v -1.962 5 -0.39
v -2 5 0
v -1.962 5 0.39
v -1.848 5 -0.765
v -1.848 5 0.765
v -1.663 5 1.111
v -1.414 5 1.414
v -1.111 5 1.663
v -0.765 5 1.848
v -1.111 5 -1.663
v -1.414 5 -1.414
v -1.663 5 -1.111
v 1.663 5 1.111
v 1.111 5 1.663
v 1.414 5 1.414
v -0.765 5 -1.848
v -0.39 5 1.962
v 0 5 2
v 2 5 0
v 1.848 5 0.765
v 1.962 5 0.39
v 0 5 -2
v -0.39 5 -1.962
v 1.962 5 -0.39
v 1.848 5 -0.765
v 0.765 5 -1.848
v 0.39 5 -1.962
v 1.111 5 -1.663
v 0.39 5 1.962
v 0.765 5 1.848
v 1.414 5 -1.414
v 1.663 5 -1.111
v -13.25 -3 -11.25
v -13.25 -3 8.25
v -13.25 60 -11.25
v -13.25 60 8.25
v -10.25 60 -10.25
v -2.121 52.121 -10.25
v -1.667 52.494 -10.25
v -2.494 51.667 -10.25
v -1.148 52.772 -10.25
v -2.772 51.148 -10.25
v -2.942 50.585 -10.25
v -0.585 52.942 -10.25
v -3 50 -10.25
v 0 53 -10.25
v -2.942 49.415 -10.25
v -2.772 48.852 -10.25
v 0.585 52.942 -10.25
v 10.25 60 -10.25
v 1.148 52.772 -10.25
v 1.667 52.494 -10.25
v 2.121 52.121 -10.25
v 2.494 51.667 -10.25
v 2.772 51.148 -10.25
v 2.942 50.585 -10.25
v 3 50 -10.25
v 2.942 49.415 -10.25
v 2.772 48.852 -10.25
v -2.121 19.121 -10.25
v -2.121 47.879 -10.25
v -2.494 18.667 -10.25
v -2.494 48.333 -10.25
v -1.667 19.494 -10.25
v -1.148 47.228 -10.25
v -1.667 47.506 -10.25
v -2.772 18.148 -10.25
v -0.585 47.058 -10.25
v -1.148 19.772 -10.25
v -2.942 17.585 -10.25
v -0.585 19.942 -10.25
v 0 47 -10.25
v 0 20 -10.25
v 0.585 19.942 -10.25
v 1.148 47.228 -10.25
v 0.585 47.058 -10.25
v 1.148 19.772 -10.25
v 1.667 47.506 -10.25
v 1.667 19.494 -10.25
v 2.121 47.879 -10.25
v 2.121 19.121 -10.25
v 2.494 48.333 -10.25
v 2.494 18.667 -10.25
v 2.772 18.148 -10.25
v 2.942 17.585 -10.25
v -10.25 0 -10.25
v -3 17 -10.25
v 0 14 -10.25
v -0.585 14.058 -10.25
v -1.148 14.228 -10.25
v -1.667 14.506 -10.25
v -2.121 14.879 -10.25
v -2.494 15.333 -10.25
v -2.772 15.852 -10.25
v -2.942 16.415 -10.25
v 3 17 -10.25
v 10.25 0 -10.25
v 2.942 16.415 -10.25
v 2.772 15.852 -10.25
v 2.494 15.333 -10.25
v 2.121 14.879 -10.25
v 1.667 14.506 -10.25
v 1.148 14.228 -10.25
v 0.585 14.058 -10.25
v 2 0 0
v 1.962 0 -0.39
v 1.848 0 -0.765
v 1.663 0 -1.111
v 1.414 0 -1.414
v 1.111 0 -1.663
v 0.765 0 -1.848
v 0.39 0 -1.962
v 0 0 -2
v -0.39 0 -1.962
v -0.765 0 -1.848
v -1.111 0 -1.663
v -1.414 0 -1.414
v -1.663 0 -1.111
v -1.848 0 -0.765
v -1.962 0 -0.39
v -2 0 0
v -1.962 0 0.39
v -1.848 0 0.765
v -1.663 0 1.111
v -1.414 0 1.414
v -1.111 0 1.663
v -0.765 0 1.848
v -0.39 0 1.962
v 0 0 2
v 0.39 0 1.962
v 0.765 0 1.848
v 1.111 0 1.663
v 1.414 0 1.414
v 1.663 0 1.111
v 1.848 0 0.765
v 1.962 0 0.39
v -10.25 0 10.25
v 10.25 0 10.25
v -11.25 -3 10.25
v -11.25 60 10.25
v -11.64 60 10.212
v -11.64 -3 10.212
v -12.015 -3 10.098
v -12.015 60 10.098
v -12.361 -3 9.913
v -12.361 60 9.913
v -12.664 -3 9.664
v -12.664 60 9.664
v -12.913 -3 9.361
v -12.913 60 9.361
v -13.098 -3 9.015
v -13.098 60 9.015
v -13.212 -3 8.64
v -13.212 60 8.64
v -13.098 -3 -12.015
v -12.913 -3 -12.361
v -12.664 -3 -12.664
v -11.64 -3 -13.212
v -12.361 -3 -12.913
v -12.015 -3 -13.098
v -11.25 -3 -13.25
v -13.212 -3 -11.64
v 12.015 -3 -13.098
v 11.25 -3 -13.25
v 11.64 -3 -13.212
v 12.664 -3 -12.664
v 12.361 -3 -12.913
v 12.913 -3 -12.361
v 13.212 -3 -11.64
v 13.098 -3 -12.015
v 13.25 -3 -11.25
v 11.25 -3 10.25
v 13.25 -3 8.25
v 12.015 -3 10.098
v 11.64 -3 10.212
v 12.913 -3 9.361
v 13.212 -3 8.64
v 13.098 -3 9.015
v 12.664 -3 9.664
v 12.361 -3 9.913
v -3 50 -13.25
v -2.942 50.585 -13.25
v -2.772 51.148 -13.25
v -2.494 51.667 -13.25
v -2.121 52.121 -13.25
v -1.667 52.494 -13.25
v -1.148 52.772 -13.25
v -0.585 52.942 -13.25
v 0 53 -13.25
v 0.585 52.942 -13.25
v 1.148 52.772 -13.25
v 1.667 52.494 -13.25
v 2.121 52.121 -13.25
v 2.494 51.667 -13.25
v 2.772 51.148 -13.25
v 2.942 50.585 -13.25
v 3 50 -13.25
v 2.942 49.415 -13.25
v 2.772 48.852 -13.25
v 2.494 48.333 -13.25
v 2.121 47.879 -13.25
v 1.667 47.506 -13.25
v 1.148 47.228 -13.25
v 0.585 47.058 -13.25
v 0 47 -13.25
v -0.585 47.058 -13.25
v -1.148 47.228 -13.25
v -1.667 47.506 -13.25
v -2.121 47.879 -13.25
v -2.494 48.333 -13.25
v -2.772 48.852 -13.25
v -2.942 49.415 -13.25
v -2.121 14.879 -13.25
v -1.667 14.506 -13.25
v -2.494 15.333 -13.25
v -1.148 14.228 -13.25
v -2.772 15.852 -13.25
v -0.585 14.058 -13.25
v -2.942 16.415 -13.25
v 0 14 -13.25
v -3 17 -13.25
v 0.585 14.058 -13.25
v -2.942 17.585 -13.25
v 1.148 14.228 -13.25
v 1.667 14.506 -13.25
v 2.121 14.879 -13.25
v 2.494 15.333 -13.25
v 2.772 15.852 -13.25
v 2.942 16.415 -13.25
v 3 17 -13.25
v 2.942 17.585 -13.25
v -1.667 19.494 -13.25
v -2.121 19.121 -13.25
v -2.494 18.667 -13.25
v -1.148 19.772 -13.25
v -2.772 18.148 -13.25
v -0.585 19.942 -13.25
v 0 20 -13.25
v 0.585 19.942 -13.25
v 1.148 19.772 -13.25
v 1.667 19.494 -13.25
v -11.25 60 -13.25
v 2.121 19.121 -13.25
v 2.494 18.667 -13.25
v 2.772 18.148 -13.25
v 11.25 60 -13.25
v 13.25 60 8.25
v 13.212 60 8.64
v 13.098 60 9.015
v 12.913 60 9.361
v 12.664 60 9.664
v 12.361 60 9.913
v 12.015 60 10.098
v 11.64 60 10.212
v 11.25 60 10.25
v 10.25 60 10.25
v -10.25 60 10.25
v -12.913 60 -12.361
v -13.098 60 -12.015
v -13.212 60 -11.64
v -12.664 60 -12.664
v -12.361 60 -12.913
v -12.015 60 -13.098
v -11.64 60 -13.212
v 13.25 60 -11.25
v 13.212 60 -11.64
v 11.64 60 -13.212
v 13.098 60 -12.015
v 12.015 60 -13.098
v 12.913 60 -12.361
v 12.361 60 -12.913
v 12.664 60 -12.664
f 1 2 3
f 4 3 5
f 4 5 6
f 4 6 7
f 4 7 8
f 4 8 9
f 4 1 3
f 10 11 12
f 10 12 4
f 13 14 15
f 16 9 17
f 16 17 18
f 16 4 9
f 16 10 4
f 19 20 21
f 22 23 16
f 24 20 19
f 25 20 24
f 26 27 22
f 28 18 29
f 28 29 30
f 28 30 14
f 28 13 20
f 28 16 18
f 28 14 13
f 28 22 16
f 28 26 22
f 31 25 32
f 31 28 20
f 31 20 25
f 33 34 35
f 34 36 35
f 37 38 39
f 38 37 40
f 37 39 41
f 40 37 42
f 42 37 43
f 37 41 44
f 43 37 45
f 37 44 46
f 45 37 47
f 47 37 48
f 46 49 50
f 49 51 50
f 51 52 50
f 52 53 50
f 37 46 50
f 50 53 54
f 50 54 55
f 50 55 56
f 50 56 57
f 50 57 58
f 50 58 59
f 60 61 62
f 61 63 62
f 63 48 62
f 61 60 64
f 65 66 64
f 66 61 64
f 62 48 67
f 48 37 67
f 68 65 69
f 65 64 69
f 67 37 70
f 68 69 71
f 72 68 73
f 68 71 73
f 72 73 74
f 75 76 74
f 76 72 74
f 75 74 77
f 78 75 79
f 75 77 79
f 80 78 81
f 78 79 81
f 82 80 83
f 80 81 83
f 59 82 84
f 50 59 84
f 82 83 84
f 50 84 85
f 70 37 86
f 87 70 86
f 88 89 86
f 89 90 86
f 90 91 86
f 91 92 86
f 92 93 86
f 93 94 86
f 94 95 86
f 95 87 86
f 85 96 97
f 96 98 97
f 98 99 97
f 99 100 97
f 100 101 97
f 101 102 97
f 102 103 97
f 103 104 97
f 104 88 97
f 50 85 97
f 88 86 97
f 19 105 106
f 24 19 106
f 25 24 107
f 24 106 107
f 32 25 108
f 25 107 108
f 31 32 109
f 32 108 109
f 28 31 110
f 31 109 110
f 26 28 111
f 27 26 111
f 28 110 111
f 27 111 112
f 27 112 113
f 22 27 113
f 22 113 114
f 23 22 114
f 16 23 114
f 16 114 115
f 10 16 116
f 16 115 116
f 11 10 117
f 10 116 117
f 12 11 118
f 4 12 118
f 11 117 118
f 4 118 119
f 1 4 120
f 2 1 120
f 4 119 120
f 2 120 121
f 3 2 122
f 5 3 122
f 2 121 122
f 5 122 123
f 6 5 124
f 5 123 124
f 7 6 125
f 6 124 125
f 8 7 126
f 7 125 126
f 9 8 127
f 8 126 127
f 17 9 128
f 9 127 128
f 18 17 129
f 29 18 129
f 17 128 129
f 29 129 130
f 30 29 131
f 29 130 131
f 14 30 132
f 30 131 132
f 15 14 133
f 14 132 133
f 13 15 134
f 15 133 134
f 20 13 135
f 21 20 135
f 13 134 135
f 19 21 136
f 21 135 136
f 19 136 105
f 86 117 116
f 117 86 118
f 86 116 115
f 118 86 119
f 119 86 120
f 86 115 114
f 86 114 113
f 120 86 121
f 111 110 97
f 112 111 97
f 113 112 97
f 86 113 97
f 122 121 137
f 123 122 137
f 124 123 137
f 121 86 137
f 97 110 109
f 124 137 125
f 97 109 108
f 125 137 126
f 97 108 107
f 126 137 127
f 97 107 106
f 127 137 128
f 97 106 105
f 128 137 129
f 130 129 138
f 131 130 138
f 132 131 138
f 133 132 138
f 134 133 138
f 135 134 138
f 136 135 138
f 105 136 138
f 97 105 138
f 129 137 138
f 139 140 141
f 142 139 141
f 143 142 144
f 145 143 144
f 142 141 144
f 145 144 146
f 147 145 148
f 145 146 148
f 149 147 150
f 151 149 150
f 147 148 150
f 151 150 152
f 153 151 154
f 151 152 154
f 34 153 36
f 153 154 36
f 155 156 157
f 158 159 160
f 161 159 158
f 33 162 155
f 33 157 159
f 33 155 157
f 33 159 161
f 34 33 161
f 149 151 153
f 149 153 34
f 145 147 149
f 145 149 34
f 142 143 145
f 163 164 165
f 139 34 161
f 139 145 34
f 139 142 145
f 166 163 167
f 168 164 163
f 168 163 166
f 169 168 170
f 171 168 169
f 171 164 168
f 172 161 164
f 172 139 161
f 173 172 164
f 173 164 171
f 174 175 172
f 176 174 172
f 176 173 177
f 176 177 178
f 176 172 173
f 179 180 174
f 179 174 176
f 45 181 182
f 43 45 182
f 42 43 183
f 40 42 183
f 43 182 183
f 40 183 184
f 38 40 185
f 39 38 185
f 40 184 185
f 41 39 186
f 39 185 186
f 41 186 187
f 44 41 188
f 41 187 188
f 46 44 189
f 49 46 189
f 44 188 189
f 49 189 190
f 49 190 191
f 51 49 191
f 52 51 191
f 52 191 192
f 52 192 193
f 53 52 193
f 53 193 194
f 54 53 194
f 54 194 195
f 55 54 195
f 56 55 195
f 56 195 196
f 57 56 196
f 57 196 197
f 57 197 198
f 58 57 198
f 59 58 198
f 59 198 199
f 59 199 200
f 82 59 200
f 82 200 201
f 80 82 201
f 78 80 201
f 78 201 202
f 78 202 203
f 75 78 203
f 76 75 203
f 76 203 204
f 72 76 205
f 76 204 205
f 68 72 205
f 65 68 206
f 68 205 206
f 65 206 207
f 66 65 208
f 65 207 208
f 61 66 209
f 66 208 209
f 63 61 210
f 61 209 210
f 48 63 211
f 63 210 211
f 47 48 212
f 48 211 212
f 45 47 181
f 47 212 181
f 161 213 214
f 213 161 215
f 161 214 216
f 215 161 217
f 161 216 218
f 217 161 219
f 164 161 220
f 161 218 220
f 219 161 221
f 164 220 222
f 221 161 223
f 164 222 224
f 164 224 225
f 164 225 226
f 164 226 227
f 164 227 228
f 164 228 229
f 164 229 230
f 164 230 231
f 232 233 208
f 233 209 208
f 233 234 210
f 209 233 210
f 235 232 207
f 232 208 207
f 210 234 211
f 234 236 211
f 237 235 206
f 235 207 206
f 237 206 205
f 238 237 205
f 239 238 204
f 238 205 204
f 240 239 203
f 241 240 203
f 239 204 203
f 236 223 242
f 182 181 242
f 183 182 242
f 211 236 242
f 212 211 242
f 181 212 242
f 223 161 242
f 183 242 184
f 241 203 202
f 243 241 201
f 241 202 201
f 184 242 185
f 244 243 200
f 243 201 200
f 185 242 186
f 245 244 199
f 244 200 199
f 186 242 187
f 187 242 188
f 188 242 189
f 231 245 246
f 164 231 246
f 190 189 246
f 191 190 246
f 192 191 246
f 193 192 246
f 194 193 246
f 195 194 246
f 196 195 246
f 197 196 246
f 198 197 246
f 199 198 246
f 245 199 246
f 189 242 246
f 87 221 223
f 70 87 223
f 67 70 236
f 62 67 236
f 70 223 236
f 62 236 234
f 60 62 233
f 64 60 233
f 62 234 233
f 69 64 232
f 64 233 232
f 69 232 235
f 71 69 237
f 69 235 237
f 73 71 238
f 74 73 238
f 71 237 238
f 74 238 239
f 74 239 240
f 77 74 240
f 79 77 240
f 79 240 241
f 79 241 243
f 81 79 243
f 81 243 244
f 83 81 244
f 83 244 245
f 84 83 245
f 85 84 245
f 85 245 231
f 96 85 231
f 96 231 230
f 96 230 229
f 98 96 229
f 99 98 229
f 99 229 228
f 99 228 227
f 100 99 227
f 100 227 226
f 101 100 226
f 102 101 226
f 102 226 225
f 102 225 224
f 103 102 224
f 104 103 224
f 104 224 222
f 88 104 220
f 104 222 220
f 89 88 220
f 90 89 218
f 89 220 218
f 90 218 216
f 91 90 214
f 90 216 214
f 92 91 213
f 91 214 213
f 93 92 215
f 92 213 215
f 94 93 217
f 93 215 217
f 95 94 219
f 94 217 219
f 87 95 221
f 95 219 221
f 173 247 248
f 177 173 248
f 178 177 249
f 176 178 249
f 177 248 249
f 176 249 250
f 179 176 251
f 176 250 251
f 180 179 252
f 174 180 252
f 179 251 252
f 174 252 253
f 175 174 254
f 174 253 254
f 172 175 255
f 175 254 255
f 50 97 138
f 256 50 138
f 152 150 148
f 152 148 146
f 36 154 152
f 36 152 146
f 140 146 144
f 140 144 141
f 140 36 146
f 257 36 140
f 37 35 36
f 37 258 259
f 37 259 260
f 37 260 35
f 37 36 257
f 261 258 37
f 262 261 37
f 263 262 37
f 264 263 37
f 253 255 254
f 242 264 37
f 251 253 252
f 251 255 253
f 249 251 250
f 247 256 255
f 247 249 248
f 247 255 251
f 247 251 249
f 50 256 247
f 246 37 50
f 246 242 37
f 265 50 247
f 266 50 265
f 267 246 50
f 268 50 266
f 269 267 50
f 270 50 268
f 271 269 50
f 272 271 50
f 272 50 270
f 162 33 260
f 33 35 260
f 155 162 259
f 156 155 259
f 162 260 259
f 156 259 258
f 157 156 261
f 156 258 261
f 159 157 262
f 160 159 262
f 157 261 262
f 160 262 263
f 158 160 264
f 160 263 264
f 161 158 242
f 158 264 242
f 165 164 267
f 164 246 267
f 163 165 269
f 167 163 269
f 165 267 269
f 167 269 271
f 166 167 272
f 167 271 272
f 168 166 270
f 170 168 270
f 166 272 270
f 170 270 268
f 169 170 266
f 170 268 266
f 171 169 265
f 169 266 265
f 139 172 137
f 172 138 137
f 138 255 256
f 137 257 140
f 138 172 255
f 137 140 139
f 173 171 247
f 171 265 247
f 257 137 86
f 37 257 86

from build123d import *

# Parameters (mm, degrees)
BOSS_EXTRUDE1_DEPTH = 60
SKETCH2_W           = 20.5
SKETCH2_H           = 20.5
BOSS_EXTRUDE2_DEPTH = 3
SKETCH3_R           = 2
BOSS_EXTRUDE3_DEPTH = 5
SKETCH4_R           = 3
CUT_EXTRUDE1_DEPTH  = 23.5


with BuildPart() as part:
    # Sketch1 → Boss-Extrude1 (new body)
    with BuildSketch(Plane(origin=(0, 0, 0), x_dir=(1, 0, 0), z_dir=(0, 1, 0))):
        with BuildLine():
            Line((-13.25, 11.25), (-13.25, -8.25))
            ThreePointArc((-13.25, -8.25), (-12.664213562, -9.664213562), (-11.25, -10.25))
            Line((-11.25, -10.25), (-10.25, -10.25))
            Line((-10.25, -10.25), (-10.25, 10.25))
            Line((-10.25, 10.25), (10.25, 10.25))
            Line((10.25, 10.25), (10.25, -10.25))
            Line((10.25, -10.25), (11.25, -10.25))
            ThreePointArc((11.25, -10.25), (12.664213562, -9.664213562), (13.25, -8.25))
            Line((13.25, -8.25), (13.25, 11.25))
            ThreePointArc((13.25, 11.25), (12.664213562, 12.664213562), (11.25, 13.25))
            Line((11.25, 13.25), (-11.25, 13.25))
            ThreePointArc((-11.25, 13.25), (-12.664213562, 12.664213562), (-13.25, 11.25))
        make_face()
    extrude(amount=BOSS_EXTRUDE1_DEPTH)

    # Sketch2 → Boss-Extrude2 (add)
    with BuildSketch(Plane.XZ):
        with BuildLine():
            ThreePointArc((-11.25, 10.25), (-12.664213562, 9.664213562), (-13.25, 8.25))
            Line((-13.25, 8.25), (-13.25, -11.25))
            ThreePointArc((-13.25, -11.25), (-12.664213562, -12.664213562), (-11.25, -13.25))
            Line((-11.25, -13.25), (11.25, -13.25))
            ThreePointArc((11.25, -13.25), (12.664213562, -12.664213562), (13.25, -11.25))
            Line((13.25, -11.25), (13.25, 8.25))
            ThreePointArc((13.25, 8.25), (12.664213562, 9.664213562), (11.25, 10.25))
            Line((11.25, 10.25), (10.25, 10.25))
            Line((10.25, 10.25), (10.25, -10.25))
            Line((10.25, -10.25), (-10.25, -10.25))
            Line((-10.25, -10.25), (-10.25, 10.25))
            Line((-10.25, 10.25), (-11.25, 10.25))
        make_face()
        Rectangle(SKETCH2_W, SKETCH2_H)
    extrude(amount=BOSS_EXTRUDE2_DEPTH)

    # Sketch3 → Boss-Extrude3 (add)
    with BuildSketch(Plane(origin=(0, 0, 0), x_dir=(1, 0, 0), z_dir=(0, 1, 0))):
        Circle(SKETCH3_R)
    extrude(amount=BOSS_EXTRUDE3_DEPTH)

    # Sketch4 → Cut-Extrude1 (cut)
    with BuildSketch(Plane(origin=(0, 0, -13.25), x_dir=(-1, 0, 0), z_dir=(0, 0, -1))):
        with Locations((0, 50)):
            Circle(SKETCH4_R)
        with Locations((0, 17)):
            Circle(SKETCH4_R)
    extrude(amount=-CUT_EXTRUDE1_DEPTH, mode=Mode.SUBTRACT)


solid = part.part
